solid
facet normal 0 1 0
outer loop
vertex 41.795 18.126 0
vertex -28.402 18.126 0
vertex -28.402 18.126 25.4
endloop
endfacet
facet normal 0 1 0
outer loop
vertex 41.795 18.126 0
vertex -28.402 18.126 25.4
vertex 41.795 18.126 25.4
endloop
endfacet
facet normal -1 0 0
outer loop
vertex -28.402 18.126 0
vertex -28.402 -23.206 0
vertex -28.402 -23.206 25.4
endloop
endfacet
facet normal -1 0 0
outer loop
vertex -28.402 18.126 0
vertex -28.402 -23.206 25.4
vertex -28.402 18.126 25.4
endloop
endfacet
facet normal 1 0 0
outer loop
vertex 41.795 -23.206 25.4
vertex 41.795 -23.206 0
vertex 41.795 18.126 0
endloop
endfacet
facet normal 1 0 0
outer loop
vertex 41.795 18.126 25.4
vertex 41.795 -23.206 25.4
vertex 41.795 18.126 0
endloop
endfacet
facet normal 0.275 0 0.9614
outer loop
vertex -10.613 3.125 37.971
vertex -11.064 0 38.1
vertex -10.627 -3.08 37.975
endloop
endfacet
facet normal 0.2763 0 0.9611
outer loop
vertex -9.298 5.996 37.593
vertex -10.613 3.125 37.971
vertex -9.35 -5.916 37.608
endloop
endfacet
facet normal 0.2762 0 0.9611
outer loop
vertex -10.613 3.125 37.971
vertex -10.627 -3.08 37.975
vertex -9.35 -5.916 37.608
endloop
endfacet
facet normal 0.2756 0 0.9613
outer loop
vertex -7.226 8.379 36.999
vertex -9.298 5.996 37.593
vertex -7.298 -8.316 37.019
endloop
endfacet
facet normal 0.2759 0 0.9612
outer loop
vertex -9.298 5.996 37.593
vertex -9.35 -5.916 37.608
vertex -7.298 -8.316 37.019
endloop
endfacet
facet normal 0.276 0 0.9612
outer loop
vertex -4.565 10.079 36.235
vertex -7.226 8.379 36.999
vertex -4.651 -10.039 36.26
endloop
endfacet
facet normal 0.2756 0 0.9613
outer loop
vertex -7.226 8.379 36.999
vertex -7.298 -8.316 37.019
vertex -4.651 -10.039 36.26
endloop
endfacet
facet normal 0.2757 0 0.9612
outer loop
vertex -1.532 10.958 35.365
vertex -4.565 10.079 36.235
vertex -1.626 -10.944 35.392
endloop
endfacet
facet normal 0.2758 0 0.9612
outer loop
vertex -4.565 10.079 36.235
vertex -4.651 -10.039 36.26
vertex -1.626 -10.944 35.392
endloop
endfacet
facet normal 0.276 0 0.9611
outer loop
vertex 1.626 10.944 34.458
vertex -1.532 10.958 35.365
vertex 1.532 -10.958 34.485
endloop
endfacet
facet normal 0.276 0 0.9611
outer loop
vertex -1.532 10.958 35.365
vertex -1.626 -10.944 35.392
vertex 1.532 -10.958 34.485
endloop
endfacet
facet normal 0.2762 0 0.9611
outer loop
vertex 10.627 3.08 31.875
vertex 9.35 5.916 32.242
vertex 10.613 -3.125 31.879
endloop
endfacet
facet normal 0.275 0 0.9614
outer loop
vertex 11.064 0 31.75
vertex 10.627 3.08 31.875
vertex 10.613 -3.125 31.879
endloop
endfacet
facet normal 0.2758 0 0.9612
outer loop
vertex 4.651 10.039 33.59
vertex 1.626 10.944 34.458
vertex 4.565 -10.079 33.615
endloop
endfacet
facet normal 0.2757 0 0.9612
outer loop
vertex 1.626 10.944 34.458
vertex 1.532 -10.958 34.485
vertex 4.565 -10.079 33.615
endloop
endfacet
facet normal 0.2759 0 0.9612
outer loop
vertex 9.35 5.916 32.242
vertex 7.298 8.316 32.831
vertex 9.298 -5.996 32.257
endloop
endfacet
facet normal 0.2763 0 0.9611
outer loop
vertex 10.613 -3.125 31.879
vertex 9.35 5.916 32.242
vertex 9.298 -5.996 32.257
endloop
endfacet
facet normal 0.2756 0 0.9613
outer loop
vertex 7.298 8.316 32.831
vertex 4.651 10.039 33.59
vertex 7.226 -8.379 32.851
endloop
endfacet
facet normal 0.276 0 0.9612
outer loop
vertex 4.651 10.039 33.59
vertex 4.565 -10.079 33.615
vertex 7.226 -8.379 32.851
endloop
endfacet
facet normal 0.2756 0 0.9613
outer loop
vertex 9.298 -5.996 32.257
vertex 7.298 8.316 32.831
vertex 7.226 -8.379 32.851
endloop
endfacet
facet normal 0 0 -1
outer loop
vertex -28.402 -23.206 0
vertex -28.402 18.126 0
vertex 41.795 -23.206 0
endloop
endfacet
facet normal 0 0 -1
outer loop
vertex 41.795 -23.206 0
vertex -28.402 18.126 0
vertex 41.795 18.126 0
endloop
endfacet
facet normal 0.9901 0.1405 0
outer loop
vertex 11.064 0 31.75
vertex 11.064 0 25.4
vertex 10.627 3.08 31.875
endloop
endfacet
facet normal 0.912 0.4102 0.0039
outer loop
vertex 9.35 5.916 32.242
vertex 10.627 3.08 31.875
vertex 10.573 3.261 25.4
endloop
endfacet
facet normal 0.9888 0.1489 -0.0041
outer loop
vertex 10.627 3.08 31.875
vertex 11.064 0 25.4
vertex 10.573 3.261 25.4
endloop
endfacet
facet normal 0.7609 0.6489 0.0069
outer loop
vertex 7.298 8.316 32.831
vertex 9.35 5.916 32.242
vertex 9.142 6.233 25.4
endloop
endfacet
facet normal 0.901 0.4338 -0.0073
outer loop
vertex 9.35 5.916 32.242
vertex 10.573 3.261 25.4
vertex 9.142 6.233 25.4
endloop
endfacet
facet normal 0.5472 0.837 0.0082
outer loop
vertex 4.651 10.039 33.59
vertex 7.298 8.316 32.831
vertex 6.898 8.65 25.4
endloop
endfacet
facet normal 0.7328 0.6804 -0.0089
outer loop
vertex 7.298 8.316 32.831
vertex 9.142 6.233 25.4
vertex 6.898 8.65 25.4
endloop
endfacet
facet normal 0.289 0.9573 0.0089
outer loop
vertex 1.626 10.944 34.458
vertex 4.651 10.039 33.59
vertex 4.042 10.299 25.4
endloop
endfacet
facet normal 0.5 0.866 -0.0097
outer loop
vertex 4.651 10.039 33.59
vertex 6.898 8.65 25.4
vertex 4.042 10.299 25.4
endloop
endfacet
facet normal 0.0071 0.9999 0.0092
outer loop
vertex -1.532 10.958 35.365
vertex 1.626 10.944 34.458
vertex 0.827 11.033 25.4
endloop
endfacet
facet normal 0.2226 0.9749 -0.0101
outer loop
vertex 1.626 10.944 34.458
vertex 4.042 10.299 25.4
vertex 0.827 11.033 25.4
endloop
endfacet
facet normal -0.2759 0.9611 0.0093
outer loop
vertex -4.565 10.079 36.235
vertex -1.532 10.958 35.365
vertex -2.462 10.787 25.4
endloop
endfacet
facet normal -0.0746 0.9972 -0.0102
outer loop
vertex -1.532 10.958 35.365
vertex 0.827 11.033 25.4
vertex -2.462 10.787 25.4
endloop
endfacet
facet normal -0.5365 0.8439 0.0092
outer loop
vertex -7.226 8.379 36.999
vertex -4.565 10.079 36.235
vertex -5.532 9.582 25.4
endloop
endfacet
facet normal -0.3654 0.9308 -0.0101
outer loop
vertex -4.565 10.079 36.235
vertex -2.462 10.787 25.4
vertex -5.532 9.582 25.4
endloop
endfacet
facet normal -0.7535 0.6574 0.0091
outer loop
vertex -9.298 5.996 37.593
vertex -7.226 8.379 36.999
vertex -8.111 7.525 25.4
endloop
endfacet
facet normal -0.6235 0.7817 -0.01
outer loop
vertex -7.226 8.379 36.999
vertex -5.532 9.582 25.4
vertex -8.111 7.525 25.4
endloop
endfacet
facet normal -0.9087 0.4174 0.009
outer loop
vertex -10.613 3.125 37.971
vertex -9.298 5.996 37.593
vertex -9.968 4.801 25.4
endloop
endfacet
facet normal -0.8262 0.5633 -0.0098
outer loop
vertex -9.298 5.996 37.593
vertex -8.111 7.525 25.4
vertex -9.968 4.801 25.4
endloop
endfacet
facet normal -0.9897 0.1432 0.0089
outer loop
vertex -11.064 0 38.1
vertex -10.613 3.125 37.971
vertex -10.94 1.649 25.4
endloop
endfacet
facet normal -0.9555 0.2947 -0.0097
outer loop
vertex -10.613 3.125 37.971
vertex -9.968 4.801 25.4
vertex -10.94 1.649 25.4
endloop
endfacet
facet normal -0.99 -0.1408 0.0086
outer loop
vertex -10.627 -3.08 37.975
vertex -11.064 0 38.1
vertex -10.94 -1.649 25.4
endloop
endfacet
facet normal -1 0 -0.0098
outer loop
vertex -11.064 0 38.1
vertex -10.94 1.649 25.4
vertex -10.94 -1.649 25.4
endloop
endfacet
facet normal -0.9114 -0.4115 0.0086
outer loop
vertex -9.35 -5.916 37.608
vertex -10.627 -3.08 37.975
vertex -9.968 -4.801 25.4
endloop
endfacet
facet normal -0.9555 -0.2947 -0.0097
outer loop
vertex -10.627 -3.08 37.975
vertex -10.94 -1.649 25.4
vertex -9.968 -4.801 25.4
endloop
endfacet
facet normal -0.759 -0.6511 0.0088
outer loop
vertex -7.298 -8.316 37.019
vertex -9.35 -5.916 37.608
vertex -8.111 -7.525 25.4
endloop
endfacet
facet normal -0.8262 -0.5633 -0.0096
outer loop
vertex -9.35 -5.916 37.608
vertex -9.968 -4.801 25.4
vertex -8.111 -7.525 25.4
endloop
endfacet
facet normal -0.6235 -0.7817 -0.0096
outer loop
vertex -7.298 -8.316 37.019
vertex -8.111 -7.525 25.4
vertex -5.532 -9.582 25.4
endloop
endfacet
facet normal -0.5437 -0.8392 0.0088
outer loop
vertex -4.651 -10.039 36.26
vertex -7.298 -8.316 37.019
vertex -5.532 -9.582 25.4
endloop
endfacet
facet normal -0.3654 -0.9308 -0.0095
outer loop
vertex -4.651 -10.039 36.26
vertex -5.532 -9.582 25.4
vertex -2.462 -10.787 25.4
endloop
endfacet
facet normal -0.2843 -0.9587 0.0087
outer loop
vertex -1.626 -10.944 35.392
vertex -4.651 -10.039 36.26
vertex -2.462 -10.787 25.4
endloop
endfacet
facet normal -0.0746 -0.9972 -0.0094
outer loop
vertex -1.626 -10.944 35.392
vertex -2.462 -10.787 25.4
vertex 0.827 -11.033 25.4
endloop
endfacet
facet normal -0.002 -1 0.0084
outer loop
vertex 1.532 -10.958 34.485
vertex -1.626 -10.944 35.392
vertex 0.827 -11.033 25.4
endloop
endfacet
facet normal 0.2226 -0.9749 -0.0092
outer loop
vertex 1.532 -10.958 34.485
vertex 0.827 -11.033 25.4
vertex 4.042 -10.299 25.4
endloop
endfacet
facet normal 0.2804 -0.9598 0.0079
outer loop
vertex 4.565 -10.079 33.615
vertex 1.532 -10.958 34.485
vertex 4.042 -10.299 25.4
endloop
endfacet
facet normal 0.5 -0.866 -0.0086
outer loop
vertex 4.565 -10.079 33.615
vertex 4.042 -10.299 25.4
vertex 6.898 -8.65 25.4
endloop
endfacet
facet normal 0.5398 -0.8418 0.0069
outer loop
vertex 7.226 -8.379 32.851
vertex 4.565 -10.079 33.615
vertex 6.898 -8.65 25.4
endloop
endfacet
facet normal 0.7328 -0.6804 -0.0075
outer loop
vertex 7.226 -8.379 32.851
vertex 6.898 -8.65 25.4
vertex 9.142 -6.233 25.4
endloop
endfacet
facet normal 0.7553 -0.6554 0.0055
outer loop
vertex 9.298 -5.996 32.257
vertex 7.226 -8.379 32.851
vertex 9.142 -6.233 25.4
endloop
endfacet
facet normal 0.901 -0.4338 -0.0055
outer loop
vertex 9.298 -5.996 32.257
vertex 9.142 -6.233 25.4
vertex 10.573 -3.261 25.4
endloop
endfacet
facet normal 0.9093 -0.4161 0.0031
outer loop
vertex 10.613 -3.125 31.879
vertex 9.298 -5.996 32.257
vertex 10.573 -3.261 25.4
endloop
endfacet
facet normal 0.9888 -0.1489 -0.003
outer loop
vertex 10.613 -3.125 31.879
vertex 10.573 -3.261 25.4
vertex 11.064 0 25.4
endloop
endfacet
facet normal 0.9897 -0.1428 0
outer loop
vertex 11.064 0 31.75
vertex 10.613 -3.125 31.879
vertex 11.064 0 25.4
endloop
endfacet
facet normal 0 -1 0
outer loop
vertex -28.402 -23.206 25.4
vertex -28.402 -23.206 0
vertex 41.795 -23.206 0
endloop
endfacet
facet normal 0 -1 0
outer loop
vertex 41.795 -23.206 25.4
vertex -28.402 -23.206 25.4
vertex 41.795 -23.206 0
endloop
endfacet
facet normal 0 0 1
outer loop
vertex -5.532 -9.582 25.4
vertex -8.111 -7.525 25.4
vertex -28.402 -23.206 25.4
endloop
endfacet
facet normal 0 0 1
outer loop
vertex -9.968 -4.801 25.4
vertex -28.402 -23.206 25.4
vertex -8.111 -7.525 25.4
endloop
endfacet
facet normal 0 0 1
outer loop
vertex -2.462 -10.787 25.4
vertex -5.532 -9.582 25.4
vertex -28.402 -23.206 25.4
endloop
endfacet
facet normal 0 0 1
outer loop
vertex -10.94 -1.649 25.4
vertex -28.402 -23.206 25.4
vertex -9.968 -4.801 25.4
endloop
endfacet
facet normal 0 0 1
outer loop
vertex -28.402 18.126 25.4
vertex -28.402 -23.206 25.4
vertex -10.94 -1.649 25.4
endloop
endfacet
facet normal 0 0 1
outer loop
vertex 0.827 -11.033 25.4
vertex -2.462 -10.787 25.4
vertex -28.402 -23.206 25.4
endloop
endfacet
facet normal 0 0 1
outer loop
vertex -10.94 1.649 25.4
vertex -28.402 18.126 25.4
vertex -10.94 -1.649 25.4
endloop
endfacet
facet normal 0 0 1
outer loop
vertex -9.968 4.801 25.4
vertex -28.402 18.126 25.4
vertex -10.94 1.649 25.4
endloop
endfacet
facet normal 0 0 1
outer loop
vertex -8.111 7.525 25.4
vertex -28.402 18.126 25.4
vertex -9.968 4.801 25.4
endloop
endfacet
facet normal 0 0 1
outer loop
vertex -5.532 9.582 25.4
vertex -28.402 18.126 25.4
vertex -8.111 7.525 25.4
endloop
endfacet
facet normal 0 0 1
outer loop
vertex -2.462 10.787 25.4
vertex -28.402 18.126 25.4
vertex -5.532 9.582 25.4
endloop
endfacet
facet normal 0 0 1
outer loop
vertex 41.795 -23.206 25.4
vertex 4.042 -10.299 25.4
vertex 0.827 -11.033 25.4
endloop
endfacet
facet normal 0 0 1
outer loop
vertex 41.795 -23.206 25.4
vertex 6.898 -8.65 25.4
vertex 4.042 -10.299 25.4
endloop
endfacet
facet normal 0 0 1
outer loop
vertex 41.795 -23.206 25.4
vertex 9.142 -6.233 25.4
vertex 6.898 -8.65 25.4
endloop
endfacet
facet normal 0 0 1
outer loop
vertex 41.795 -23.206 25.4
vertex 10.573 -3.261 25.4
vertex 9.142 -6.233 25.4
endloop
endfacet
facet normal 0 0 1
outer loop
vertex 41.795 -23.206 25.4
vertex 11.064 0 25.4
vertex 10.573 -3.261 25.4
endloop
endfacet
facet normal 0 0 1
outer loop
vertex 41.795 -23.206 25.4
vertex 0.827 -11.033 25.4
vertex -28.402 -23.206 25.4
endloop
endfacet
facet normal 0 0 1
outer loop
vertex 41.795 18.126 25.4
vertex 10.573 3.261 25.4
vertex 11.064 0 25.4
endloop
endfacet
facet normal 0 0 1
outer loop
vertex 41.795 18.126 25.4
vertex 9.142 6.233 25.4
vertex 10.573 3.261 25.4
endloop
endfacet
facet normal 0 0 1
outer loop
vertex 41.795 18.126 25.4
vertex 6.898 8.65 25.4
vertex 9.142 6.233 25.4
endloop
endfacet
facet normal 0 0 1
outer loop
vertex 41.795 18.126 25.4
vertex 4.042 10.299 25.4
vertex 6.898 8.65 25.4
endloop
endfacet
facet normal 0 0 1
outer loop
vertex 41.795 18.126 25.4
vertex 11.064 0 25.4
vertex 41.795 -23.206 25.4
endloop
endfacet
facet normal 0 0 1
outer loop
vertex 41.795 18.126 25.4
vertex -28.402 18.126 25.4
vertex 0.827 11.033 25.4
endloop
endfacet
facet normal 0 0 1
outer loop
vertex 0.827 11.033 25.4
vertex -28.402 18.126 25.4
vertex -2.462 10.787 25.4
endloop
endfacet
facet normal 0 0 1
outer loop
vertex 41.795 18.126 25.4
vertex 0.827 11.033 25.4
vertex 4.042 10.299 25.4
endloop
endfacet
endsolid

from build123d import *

# Parameters (mm, degrees)
F0_W     = 70.196364
F0_H     = 41.332727
F1_DEPTH = 25.4
F2_R     = 11.06405
F3_DEPTH = 12.7
F5_DEPTH = 58.674


with BuildPart() as f1:
    # F0 (on Top) → F1 (new body)
    with BuildSketch(Plane.XY):
        with Locations((6.696364, -2.540001)):
            Rectangle(F0_W, F0_H)
    extrude(amount=F1_DEPTH)

    # F2 (on face) → F3 (join)
    with BuildSketch(Plane.XY.offset(25.4)):
        Circle(F2_R)
    extrude(amount=F3_DEPTH)

    # F4 (on face) → F5 (cut)
    with BuildSketch(Plane.XZ.offset(23.206364)):
        Polygon((11.06405, 38.1), (-11.06405, 38.1), (11.06405, 31.75), align=None)
    extrude(amount=-F5_DEPTH, mode=Mode.SUBTRACT)


solid = f1.part
